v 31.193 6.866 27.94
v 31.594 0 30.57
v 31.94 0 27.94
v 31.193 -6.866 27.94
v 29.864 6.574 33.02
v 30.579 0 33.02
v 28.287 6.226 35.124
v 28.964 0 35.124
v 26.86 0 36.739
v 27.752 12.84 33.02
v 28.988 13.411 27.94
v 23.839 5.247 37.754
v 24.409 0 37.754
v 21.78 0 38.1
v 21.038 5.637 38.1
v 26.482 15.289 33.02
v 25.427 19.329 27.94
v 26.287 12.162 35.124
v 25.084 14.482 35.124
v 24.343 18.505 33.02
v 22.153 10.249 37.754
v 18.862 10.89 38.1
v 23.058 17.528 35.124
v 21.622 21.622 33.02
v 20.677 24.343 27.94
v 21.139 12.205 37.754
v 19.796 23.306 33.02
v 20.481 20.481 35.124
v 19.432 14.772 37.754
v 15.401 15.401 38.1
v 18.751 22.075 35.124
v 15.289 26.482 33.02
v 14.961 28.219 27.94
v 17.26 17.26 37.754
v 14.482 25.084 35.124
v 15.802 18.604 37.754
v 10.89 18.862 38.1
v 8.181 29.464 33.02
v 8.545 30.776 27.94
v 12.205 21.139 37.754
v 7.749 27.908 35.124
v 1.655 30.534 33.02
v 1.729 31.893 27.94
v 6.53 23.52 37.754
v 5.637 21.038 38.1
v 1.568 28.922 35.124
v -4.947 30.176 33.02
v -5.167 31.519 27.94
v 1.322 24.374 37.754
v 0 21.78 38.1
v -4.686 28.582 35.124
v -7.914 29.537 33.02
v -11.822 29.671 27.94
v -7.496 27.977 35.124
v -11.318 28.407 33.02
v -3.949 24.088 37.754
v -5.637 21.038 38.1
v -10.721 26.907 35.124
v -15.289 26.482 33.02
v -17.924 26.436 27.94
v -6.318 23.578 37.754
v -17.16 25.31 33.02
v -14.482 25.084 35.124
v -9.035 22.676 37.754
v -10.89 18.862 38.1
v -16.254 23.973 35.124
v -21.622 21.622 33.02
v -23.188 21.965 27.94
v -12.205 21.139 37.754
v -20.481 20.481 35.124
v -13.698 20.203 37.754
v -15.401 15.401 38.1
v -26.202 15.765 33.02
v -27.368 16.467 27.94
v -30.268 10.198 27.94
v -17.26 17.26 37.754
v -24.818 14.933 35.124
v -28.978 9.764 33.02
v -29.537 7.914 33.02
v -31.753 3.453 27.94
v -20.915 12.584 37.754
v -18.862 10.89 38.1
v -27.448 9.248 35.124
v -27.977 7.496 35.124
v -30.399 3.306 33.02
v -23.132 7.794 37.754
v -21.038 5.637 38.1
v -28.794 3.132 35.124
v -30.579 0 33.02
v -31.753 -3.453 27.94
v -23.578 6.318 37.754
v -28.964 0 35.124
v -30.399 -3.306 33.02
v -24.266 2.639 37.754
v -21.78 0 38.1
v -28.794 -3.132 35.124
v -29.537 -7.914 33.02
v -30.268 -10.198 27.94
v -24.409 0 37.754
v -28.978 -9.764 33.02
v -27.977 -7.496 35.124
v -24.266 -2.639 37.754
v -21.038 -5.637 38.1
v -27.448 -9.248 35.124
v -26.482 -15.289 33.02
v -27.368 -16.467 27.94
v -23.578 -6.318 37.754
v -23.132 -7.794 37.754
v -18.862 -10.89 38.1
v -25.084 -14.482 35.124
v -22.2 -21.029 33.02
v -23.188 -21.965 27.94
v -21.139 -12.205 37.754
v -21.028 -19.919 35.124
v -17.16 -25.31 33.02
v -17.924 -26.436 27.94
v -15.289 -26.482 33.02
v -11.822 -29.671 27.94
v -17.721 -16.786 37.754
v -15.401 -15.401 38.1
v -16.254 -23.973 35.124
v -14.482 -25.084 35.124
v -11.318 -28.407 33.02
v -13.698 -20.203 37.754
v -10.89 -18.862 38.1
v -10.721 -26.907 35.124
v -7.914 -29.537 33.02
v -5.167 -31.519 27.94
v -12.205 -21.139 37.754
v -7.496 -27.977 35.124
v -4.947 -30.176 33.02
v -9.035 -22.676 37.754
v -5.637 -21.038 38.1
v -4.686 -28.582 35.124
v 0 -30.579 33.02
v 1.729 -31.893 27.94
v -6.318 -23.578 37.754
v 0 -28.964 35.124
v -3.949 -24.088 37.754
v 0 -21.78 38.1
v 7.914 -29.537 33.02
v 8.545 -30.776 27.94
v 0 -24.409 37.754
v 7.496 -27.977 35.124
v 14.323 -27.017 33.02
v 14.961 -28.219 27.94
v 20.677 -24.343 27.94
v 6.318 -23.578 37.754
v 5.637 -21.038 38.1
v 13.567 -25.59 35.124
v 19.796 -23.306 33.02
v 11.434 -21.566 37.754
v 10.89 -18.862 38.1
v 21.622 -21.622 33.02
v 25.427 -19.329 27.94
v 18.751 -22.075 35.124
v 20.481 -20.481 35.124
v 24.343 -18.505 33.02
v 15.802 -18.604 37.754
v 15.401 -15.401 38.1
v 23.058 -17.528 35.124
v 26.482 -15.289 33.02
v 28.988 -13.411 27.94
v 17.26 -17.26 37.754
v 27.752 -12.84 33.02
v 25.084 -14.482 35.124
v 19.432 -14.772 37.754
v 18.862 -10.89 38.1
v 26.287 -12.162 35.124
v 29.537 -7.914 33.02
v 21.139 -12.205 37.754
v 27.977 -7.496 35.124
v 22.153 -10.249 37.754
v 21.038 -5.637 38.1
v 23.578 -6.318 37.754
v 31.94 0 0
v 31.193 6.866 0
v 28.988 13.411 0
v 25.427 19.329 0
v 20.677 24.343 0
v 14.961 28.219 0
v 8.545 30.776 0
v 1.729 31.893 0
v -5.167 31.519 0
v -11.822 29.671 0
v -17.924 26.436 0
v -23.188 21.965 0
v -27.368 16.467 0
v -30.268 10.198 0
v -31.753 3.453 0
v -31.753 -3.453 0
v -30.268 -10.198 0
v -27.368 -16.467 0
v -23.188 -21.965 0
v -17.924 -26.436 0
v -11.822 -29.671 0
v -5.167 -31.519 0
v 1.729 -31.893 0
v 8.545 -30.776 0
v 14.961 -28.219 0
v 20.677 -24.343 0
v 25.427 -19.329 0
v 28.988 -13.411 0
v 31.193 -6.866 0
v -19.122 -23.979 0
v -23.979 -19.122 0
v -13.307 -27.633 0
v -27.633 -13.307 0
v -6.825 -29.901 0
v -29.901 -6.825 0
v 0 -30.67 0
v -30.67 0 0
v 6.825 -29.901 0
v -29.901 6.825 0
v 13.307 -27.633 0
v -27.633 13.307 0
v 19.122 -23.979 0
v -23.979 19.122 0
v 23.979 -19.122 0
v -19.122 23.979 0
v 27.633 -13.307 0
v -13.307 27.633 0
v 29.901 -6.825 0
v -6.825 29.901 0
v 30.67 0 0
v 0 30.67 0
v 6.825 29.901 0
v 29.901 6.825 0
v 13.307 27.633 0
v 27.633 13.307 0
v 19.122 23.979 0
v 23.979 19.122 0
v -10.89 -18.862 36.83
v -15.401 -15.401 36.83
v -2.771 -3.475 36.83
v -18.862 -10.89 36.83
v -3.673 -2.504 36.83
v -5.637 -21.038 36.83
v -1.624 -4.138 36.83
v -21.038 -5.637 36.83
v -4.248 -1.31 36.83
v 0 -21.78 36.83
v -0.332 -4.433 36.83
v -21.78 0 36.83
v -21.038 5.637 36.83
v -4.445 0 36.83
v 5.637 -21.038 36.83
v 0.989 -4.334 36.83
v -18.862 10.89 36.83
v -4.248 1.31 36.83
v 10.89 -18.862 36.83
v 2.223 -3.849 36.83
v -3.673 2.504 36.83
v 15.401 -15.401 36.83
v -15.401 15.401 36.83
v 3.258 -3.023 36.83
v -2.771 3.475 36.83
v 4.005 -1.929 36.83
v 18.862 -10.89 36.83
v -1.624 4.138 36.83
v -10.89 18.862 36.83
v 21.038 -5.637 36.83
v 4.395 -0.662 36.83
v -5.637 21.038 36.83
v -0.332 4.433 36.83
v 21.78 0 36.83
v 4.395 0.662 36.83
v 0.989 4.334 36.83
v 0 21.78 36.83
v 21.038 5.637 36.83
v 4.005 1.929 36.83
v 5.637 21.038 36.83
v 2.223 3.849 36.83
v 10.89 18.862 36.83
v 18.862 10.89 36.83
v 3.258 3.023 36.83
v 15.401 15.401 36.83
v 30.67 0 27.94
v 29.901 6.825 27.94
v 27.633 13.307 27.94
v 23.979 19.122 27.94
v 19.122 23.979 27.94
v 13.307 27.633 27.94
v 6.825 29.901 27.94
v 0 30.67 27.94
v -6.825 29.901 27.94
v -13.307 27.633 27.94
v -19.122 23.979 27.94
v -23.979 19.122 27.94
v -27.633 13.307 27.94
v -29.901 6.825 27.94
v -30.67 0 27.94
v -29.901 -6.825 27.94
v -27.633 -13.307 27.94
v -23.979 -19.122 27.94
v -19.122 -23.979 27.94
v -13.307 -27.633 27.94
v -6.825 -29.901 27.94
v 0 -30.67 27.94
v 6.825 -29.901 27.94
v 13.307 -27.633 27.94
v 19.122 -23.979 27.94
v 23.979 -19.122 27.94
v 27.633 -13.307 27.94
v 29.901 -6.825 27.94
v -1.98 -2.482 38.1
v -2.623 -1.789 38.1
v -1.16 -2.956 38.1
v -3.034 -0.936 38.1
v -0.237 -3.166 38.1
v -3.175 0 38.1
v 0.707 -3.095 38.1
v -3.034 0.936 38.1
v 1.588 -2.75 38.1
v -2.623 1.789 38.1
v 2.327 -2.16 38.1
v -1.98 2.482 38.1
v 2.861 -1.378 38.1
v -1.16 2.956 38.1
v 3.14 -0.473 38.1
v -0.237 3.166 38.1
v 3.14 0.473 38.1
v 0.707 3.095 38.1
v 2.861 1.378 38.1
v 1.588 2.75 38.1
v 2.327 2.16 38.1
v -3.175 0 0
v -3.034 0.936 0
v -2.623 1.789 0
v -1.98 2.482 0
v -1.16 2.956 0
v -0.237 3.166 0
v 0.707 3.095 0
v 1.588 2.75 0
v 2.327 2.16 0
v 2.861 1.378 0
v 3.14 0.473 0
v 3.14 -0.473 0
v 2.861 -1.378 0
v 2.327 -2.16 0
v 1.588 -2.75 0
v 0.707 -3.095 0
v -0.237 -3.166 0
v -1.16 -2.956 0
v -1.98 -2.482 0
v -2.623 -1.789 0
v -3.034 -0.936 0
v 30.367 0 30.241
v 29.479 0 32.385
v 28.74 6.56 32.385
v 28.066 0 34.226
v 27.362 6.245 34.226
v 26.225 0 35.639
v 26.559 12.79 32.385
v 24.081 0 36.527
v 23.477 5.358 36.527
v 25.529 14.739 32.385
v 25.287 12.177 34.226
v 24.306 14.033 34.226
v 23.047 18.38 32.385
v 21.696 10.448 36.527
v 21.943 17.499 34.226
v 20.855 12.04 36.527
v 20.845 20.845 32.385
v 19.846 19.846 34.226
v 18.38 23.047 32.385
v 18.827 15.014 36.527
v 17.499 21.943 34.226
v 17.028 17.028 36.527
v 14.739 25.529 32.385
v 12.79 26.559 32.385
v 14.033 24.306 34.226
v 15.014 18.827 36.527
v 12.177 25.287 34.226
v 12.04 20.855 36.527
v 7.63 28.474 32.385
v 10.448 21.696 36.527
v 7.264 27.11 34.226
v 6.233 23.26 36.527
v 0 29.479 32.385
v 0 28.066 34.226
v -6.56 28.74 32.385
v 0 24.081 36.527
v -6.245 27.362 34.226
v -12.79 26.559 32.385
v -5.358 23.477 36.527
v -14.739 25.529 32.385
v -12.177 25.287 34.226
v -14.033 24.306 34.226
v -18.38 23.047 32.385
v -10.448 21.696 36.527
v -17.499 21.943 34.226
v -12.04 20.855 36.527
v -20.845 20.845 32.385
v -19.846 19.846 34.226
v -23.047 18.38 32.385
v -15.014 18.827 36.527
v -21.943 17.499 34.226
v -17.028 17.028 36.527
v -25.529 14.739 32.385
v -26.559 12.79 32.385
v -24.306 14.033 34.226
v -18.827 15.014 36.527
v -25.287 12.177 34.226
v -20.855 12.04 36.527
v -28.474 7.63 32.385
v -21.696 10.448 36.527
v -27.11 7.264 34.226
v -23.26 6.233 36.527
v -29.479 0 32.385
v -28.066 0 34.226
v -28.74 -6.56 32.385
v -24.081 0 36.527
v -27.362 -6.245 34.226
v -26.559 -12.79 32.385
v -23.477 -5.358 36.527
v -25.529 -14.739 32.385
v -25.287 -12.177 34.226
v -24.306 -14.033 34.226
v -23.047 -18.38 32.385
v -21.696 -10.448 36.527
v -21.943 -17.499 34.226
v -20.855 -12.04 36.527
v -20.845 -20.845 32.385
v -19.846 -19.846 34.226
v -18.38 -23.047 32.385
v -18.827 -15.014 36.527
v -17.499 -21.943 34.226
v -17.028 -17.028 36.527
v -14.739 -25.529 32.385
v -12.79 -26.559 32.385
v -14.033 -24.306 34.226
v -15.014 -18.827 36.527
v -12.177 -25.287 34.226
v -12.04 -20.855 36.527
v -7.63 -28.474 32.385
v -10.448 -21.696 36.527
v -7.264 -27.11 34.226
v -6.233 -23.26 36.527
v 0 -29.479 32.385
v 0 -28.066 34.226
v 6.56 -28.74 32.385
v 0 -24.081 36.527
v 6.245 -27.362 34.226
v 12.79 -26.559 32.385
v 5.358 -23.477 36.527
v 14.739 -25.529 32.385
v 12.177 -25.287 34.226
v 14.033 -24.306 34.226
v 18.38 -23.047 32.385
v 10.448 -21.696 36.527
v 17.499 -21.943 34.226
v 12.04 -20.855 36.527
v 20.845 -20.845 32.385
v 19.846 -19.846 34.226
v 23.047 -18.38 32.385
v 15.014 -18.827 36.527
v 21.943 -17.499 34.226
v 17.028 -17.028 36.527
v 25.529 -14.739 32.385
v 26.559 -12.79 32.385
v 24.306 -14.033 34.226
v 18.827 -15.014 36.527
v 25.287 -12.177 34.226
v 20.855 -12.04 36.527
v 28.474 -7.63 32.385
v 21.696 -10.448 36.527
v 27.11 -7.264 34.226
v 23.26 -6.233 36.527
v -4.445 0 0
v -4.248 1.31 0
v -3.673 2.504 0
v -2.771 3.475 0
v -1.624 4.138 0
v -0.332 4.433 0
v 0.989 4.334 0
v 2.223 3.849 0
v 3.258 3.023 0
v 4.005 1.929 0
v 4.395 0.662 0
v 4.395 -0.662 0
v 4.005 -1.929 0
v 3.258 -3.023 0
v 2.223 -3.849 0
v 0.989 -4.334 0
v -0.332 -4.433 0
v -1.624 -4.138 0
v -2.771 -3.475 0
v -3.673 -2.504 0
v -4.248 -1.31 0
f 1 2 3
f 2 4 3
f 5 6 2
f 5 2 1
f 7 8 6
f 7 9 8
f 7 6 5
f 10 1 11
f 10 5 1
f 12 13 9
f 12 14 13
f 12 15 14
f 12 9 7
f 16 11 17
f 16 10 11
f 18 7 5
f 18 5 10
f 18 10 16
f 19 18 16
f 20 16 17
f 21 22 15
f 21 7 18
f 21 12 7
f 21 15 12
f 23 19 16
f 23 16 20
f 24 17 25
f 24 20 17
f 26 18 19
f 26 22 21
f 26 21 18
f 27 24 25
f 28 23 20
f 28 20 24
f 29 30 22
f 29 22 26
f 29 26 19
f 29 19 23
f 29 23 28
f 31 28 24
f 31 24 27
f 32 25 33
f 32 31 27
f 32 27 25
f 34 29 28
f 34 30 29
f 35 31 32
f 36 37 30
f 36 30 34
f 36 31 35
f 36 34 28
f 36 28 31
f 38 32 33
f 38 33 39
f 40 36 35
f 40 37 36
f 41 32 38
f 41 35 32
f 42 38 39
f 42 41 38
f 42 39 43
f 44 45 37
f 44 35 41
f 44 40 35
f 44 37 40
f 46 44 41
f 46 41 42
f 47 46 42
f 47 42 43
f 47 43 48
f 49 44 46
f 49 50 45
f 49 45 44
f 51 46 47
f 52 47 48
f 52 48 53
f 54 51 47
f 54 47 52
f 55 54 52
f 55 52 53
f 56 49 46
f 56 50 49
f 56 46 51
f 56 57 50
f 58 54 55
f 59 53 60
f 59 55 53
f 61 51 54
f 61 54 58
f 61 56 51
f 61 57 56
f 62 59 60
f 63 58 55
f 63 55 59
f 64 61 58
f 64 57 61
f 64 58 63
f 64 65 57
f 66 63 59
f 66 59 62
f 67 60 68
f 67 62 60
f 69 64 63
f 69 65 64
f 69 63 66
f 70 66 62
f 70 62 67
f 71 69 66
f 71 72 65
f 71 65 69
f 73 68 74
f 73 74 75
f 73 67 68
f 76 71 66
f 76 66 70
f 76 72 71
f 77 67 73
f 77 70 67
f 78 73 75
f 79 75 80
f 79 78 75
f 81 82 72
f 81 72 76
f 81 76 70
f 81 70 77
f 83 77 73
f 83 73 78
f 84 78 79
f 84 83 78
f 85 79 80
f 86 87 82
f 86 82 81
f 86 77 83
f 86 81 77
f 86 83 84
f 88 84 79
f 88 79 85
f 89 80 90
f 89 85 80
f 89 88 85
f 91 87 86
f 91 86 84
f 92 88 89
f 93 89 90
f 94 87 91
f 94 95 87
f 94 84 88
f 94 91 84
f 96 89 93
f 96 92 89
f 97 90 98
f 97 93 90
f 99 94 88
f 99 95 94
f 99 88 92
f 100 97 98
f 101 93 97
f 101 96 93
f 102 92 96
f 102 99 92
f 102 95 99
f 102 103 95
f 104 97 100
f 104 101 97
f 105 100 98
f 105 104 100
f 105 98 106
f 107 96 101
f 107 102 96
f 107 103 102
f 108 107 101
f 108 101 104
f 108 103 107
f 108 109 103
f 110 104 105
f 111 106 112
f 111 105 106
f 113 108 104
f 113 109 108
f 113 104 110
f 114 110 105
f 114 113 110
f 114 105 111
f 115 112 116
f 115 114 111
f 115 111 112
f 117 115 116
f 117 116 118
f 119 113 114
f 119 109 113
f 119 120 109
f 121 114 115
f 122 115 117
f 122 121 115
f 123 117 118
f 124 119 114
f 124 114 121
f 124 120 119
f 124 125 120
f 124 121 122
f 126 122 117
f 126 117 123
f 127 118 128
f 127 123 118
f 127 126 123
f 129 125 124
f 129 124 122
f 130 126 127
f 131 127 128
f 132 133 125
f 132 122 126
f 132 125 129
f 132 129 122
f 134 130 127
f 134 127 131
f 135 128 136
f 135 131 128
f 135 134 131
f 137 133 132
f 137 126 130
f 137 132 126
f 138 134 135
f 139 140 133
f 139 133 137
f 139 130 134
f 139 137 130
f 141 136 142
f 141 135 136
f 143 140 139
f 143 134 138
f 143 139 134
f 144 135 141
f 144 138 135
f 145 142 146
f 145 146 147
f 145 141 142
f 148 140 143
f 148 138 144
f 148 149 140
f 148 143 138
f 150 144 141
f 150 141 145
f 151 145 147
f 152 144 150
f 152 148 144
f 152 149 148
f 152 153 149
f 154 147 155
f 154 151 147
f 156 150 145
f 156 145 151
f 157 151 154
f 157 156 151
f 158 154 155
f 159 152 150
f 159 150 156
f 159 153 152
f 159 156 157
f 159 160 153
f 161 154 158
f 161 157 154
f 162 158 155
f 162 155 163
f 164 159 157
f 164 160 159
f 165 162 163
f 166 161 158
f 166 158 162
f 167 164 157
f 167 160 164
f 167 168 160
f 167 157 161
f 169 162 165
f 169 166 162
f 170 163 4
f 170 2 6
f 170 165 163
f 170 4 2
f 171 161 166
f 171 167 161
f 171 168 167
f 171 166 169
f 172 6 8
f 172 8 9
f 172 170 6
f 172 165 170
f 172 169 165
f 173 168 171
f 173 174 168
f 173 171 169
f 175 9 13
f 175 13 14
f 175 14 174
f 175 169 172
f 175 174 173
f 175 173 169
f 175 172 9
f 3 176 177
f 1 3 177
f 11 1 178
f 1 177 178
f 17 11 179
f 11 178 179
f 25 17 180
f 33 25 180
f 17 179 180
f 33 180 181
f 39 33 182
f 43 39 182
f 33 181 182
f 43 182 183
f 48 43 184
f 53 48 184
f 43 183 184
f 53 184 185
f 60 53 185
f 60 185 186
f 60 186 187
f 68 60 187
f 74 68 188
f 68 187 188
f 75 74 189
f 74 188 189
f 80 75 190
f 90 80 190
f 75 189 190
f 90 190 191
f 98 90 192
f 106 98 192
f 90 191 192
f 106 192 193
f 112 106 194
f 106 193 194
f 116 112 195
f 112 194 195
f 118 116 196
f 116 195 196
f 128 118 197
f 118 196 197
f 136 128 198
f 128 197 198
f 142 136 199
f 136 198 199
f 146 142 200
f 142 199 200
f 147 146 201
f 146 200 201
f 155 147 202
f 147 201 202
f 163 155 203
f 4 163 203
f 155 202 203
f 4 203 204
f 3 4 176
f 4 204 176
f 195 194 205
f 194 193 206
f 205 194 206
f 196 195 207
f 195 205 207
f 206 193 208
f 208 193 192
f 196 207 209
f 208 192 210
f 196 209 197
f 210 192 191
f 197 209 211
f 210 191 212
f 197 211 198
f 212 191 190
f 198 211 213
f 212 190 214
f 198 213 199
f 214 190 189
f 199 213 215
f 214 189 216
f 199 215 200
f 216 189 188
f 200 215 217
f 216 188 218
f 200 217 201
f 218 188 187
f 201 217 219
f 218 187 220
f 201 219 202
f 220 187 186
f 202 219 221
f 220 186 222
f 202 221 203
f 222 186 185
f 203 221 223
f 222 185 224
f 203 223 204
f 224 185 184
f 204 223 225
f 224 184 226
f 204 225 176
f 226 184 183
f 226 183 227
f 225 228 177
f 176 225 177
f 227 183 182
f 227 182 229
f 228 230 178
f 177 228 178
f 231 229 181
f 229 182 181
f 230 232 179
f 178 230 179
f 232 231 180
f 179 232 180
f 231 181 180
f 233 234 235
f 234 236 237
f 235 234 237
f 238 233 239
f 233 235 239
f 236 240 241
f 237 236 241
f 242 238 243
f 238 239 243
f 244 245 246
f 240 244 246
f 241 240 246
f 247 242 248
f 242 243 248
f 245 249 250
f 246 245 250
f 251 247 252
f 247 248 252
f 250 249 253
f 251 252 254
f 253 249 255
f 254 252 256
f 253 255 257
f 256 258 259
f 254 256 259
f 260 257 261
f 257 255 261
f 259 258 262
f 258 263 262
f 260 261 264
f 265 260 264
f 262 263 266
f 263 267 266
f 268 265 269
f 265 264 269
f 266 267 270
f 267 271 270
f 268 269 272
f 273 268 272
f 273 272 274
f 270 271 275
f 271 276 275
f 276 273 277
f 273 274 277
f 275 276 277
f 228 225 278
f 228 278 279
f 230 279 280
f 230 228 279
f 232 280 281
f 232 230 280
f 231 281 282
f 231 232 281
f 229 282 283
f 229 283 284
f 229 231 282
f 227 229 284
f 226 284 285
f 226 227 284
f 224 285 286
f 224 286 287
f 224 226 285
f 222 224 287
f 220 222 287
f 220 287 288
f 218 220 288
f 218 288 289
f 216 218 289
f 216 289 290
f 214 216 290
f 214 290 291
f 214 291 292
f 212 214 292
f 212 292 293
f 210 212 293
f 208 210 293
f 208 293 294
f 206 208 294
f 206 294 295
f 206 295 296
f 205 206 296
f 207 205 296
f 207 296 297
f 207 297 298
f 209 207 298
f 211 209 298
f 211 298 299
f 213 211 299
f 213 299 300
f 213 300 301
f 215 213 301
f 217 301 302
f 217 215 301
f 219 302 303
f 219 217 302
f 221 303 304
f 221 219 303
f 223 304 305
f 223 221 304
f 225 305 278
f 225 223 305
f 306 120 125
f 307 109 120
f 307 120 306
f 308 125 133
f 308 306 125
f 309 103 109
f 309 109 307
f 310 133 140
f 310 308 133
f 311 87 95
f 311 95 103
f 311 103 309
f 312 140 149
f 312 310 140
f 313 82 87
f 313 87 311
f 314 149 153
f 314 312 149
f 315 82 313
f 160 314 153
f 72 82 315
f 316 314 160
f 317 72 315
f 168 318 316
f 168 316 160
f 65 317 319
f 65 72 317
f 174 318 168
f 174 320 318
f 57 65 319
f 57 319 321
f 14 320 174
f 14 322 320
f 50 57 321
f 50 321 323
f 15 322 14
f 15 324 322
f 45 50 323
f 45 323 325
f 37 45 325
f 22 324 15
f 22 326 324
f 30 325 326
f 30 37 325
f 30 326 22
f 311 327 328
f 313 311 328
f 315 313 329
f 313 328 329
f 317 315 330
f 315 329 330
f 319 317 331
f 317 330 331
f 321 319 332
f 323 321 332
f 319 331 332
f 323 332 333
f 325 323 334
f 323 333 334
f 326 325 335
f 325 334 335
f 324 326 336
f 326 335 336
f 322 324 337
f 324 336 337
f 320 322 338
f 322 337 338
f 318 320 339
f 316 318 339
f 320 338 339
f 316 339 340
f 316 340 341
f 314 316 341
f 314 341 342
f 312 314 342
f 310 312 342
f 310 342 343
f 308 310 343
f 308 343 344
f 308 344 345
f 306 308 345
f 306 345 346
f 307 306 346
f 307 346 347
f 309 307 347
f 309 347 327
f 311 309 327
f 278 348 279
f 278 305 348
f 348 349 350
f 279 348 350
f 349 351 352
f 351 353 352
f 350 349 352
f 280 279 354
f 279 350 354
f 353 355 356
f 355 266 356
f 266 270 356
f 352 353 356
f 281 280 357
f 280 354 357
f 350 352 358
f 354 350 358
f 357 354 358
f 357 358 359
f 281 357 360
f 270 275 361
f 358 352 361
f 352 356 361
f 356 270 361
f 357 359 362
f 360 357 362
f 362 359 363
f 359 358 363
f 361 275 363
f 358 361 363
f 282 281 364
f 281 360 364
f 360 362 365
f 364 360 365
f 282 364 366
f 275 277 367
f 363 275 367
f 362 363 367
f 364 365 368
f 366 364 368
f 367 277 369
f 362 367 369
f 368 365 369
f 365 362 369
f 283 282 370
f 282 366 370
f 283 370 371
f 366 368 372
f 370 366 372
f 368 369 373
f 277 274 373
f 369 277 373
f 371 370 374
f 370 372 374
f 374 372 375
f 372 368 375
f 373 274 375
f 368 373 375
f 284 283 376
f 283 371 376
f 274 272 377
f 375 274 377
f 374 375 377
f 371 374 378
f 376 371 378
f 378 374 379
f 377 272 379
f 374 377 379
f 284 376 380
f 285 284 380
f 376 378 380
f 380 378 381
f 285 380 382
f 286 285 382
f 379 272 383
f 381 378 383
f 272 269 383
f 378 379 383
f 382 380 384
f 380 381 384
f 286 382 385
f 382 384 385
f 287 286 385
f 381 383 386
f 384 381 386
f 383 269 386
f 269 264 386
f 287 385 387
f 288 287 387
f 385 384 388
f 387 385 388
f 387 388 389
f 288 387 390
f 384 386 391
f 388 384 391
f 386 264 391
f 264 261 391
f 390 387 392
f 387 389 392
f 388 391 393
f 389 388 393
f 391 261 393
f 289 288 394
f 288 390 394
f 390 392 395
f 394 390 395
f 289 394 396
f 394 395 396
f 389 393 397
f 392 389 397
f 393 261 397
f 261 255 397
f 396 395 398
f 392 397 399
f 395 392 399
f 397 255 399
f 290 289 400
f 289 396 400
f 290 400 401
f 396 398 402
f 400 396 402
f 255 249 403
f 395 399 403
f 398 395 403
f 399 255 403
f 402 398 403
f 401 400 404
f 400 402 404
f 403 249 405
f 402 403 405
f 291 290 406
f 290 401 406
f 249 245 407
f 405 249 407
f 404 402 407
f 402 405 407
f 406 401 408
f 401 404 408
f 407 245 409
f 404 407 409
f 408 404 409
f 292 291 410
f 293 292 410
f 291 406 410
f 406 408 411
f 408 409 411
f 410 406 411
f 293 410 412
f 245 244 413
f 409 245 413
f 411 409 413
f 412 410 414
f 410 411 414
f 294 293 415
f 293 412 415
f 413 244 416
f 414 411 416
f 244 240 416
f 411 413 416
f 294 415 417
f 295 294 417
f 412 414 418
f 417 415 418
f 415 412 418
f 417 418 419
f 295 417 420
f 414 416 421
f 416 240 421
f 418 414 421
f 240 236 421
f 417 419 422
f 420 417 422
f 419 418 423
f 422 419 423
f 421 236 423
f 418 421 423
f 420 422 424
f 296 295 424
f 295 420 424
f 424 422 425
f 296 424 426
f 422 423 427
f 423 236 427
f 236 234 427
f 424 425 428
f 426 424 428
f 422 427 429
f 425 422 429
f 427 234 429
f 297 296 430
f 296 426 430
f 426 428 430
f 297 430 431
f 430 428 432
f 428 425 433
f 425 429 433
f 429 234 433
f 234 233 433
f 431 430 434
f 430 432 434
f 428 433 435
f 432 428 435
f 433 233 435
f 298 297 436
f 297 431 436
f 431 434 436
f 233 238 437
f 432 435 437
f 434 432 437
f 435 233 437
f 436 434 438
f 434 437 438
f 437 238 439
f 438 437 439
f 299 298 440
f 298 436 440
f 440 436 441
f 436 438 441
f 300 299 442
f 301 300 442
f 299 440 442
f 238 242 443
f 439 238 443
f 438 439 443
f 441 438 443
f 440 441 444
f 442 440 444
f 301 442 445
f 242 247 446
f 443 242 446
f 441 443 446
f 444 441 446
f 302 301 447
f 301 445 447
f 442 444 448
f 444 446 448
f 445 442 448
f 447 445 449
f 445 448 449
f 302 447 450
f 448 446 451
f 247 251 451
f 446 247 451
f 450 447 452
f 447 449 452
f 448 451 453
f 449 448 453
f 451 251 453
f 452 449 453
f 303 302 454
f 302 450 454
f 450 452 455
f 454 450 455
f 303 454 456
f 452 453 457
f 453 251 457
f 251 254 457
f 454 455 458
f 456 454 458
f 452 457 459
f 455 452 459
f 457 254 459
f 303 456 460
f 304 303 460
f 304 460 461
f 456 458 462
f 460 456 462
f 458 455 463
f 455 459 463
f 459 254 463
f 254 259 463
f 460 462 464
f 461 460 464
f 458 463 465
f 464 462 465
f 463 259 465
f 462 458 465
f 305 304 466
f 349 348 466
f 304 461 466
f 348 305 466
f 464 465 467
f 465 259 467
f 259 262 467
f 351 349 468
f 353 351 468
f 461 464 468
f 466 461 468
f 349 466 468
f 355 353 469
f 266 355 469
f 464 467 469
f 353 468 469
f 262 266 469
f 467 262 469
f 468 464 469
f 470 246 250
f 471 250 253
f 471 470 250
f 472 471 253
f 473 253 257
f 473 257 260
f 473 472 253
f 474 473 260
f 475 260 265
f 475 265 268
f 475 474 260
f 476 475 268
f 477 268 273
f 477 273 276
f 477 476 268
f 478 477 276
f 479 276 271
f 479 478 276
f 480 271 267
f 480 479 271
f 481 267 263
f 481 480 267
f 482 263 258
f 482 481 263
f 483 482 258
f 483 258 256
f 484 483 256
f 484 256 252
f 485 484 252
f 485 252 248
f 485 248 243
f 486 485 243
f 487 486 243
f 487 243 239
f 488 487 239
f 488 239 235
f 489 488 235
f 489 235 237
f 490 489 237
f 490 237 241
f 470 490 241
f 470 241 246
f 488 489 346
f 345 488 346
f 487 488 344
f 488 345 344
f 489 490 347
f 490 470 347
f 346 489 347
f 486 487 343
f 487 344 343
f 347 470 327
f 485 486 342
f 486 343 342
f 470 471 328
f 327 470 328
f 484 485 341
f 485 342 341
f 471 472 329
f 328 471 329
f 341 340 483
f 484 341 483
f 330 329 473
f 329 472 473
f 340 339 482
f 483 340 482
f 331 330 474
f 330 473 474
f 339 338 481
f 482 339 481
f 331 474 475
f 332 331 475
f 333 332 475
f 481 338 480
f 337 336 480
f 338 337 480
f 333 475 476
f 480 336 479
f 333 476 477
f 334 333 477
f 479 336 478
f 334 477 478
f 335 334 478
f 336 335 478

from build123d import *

# Parameters (mm, degrees)
F0_R     = 31.9398349348
F1_DEPTH = 38.1
F2_R     = 10.16
F4_D     = 6.35
F5_T     = -1.27


with BuildPart() as f1:
    # F0 (on Top) → F1 (new body)
    with BuildSketch(Plane.XY):
        Circle(F0_R)
    extrude(amount=F1_DEPTH)

    # F2
    f2_edges = [f1.edges().sort_by_distance(p)[0] for p in [
        (-31.939835, 0, 38.1),
    ]]
    fillet(f2_edges, radius=F2_R)

    # F4 (through all)
    with Locations(Plane.XY.offset(38.1)):
        with Locations((0, 0)):
            Hole(F4_D / 2)

    # F5
    f5_openings = [f1.faces().sort_by_distance(p)[0] for p in [
        (-31.03644, 0, 0),
    ]]
    offset(amount=F5_T, openings=f5_openings)


solid = f1.part
